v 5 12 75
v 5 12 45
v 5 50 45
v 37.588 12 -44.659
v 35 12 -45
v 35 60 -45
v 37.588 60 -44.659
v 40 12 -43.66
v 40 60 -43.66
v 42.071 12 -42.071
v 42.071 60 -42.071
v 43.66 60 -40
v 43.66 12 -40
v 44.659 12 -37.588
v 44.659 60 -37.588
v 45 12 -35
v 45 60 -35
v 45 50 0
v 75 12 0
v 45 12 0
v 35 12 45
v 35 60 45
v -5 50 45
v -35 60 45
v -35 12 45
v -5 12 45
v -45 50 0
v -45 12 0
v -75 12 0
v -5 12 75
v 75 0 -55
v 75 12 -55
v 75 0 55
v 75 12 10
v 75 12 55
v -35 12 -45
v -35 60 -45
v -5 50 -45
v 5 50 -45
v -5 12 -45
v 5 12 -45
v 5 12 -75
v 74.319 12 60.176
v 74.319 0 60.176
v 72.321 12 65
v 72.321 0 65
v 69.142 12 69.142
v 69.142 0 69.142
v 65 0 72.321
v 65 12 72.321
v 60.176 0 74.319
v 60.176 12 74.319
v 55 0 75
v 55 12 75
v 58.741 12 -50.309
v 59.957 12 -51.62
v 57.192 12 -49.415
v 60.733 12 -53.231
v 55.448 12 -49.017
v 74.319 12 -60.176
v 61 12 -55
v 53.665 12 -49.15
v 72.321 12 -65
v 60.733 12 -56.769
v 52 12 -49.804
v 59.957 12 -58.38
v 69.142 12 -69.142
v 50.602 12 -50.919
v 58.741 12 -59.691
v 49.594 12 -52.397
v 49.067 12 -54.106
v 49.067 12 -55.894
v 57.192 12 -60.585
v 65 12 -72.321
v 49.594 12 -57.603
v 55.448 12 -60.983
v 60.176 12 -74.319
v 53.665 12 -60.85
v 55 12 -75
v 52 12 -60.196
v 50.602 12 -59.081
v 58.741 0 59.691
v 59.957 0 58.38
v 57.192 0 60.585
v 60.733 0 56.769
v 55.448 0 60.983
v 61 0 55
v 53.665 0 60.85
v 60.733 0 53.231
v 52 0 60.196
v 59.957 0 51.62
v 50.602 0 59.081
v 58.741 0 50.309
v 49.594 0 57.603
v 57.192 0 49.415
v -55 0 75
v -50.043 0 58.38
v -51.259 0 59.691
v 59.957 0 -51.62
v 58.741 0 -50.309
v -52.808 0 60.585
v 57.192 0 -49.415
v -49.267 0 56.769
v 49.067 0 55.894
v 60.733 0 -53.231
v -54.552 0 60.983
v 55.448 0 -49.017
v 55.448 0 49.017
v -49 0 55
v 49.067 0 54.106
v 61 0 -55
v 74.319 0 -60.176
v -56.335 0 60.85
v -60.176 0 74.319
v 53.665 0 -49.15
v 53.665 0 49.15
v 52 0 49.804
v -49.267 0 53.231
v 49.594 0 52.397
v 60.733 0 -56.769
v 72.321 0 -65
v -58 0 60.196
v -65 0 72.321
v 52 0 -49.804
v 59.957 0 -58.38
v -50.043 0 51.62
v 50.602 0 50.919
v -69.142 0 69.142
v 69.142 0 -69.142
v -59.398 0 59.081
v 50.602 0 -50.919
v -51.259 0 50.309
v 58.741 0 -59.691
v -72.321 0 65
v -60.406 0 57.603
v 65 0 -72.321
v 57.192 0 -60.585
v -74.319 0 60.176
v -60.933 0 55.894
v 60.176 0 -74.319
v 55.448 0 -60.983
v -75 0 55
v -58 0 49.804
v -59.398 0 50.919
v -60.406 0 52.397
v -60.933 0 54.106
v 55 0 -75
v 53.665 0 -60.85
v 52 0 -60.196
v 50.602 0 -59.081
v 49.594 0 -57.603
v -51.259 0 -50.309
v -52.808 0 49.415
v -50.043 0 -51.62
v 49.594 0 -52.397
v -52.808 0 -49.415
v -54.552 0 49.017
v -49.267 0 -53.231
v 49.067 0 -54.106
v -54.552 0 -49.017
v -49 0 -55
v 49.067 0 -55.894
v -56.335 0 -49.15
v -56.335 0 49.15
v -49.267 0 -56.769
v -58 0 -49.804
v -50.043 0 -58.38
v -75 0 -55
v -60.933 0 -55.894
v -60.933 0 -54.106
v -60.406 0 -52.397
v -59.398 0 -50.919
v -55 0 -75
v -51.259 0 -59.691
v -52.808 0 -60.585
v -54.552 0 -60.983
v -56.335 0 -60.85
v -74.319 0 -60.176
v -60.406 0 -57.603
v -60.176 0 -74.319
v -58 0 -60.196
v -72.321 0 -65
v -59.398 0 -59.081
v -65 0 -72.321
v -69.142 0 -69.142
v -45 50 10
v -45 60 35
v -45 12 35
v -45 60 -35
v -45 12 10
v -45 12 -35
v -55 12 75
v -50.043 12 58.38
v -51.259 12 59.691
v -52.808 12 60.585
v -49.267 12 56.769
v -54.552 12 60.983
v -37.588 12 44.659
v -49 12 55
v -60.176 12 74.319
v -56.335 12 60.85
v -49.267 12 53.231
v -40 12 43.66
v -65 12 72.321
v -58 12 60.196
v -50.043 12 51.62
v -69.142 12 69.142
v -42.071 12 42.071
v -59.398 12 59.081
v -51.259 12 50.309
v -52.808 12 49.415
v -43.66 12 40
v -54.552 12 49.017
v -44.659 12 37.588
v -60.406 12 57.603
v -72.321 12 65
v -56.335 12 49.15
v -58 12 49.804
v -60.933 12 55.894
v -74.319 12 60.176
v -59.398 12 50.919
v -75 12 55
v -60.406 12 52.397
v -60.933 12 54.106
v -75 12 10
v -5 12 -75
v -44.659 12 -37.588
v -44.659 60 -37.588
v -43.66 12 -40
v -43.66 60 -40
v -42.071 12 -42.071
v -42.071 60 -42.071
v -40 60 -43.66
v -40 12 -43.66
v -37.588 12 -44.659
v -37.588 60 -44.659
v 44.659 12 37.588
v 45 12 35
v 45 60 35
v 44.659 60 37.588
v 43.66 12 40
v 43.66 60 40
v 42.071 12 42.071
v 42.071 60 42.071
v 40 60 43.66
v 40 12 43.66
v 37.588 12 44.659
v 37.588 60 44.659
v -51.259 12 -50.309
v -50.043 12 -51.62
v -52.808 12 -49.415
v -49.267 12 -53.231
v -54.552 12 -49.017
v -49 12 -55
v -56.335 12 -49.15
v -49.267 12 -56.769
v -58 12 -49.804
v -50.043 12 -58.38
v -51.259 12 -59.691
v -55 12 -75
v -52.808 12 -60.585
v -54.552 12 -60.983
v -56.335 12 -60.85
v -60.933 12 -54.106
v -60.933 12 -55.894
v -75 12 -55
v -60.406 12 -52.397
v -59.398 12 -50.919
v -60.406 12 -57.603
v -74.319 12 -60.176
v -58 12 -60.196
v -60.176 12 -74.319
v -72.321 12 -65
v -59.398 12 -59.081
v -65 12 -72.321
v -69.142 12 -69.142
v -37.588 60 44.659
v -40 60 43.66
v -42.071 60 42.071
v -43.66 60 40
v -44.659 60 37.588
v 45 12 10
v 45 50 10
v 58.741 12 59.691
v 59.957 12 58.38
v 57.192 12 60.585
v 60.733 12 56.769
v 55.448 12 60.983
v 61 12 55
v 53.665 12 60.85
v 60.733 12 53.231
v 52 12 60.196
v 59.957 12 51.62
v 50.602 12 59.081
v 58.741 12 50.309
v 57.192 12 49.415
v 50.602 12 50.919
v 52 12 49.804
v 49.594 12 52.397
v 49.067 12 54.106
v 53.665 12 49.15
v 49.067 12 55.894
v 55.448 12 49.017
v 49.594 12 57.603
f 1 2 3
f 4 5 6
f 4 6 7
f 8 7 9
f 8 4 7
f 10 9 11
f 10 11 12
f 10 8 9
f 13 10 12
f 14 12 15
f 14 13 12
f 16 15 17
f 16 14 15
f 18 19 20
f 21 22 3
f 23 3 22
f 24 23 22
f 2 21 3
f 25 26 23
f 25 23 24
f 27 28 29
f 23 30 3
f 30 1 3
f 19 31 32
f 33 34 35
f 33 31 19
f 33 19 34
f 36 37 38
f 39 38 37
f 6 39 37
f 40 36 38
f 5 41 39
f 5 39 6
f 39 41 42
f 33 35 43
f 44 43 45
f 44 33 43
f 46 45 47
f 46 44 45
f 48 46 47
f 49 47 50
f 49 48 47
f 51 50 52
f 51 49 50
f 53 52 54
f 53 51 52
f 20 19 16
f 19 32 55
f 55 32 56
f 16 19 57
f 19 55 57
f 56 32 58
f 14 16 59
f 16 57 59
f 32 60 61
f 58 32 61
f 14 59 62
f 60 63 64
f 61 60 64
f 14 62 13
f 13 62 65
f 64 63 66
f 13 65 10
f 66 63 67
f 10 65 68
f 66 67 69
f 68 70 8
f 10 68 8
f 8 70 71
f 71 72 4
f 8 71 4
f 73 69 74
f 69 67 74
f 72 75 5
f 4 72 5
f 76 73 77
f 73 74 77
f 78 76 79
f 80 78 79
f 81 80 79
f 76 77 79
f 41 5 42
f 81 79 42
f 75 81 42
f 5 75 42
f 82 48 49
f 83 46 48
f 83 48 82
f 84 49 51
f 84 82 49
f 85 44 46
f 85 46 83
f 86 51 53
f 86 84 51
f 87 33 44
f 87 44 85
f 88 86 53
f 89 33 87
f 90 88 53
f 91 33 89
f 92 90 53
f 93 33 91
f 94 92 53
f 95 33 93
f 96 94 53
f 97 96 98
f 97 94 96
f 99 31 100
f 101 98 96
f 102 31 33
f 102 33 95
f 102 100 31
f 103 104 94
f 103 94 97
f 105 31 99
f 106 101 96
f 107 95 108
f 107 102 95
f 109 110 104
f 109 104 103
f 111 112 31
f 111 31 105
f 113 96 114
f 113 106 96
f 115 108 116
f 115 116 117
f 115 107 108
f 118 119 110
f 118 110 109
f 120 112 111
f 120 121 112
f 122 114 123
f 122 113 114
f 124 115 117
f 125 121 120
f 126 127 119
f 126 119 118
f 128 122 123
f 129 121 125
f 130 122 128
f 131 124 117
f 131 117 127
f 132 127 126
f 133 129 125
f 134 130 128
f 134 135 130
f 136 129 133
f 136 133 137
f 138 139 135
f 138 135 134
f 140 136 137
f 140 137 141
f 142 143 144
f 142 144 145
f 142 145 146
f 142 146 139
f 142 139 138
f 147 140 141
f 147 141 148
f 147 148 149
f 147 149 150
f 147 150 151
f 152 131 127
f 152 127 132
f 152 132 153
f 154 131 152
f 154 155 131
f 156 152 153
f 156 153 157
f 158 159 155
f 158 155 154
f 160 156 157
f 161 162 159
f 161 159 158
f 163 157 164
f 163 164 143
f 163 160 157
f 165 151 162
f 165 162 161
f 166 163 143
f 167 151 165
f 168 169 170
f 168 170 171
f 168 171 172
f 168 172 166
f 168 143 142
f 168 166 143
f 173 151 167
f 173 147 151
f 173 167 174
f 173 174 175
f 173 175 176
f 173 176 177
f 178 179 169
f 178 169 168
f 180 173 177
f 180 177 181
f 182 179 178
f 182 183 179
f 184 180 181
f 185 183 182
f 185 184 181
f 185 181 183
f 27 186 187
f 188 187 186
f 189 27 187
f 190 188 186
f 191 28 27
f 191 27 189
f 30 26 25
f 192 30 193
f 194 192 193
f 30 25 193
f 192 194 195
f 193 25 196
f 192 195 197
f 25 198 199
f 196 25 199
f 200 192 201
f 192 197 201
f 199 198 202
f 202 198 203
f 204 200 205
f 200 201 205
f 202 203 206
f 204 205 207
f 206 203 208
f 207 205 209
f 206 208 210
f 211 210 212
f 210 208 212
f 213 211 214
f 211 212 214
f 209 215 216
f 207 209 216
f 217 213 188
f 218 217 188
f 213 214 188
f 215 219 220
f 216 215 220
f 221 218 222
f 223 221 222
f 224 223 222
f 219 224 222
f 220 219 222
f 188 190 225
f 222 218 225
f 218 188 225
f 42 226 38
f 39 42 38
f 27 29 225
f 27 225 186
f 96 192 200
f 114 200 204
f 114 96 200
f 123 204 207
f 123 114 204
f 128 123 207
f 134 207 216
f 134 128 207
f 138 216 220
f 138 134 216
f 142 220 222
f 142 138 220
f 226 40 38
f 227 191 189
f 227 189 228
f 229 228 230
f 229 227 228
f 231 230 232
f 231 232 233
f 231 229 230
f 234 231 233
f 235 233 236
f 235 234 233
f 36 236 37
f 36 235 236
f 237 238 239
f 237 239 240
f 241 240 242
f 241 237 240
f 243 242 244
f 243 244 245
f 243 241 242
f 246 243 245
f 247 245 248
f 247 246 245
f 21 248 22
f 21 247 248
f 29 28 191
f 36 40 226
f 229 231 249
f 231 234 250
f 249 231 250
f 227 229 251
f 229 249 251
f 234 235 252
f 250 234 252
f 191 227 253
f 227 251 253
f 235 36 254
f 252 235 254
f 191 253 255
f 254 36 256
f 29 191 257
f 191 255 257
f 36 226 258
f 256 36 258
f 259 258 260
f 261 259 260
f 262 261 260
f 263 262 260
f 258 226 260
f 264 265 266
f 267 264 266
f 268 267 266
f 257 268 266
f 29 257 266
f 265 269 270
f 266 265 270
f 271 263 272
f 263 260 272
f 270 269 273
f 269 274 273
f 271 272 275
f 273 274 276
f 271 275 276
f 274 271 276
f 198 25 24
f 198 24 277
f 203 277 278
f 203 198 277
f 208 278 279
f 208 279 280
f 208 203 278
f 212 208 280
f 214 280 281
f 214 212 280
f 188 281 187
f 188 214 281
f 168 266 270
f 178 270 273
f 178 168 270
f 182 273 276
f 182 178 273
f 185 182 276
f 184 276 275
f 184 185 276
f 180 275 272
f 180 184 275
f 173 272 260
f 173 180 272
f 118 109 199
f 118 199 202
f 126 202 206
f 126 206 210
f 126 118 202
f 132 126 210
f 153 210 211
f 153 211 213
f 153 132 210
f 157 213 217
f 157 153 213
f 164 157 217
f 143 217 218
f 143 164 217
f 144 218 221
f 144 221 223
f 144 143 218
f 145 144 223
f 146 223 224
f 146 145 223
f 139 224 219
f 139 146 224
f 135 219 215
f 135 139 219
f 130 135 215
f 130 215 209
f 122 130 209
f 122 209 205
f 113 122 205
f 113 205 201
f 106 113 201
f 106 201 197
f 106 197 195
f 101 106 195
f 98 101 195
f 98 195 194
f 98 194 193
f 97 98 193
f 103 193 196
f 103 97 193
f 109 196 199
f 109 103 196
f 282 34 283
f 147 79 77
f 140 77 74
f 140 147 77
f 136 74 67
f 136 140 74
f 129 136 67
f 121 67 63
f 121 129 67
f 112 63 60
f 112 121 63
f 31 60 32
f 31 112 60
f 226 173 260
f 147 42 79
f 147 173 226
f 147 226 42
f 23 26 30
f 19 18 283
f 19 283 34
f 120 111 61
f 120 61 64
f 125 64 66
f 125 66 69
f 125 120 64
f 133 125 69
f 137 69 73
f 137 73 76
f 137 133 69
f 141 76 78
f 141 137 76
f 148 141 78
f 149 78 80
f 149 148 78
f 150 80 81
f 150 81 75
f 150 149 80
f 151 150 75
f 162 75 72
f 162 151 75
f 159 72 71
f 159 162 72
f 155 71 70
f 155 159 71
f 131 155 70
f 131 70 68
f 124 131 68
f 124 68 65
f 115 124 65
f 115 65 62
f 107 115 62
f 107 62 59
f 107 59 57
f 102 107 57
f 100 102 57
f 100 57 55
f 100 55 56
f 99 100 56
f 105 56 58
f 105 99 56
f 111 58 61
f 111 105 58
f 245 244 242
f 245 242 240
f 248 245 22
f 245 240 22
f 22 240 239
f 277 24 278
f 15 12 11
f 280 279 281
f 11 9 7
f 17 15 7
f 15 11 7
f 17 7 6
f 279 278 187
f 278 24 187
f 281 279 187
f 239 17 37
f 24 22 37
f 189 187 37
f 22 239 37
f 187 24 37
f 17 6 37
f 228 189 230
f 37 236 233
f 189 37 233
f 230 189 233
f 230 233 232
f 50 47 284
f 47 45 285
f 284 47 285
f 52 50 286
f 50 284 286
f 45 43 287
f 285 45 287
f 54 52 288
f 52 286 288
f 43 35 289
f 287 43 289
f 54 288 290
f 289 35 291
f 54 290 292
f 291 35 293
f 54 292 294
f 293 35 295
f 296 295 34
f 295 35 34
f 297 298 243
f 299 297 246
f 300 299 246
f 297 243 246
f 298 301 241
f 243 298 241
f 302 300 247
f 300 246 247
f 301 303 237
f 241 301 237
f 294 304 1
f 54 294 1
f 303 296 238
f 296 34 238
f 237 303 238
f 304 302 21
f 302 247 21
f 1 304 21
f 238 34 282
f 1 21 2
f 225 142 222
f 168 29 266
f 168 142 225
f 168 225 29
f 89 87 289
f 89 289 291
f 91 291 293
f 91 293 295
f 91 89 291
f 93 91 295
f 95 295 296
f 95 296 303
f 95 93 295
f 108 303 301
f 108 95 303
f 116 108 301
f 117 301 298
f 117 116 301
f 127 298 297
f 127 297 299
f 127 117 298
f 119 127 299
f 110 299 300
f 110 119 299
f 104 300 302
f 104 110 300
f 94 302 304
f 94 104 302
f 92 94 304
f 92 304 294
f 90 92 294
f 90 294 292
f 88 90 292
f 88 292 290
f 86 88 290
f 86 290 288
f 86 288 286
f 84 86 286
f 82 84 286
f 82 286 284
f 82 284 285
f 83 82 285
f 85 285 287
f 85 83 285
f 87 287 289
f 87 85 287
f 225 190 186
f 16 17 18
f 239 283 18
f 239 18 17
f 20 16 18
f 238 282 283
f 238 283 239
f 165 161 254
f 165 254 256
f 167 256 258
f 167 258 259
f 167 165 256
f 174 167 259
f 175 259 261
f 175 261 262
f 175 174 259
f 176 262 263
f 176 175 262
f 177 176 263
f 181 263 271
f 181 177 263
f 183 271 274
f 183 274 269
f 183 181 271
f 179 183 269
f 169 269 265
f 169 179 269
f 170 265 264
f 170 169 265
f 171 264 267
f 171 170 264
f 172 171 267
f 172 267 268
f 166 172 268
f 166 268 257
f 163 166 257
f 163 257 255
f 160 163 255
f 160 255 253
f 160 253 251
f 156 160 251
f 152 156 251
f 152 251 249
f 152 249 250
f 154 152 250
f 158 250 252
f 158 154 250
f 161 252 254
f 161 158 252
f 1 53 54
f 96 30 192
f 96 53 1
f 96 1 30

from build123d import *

# Parameters (mm, degrees)
SKETCH1_R           = 6
BOSS_EXTRUDE2_DEPTH = 12
BOSS_EXTRUDE3_DEPTH = 48
BOSS_EXTRUDE5_DEPTH = 5
BOSS_EXTRUDE6_DEPTH = 10


with BuildPart() as part:
    # Sketch1 → Boss-Extrude2 (new body)
    with BuildSketch(Plane(origin=(0, 0, 0), x_dir=(1, 0, 0), z_dir=(0, 1, 0))):
        with BuildLine():
            Line((-55, 75), (55, 75))
            ThreePointArc((55, 75), (69.142135624, 69.142135624), (75, 55))
            Line((75, 55), (75, -55))
            ThreePointArc((75, -55), (69.142135624, -69.142135624), (55, -75))
            Line((55, -75), (-55, -75))
            ThreePointArc((-55, -75), (-69.142135624, -69.142135624), (-75, -55))
            Line((-75, -55), (-75, 55))
            ThreePointArc((-75, 55), (-69.142135624, 69.142135624), (-55, 75))
        make_face()
        with Locations((-55, 55)):
            Circle(SKETCH1_R, mode=Mode.SUBTRACT)
        with Locations((-55, -55)):
            Circle(SKETCH1_R, mode=Mode.SUBTRACT)
        with Locations((55, -55)):
            Circle(SKETCH1_R, mode=Mode.SUBTRACT)
        with Locations((55, 55)):
            Circle(SKETCH1_R, mode=Mode.SUBTRACT)
    extrude(amount=BOSS_EXTRUDE2_DEPTH)

    # Sketch2 → Boss-Extrude3 (add)
    with BuildSketch(Plane(origin=(0, 12, 0), x_dir=(1, 0, 0), z_dir=(0, 1, 0))):
        with BuildLine():
            Line((-35, 45), (35, 45))
            ThreePointArc((35, 45), (42.071067812, 42.071067812), (45, 35))
            Line((45, 35), (45, -35))
            ThreePointArc((45, -35), (42.071067812, -42.071067812), (35, -45))
            Line((35, -45), (-35, -45))
            ThreePointArc((-35, -45), (-42.071067812, -42.071067812), (-45, -35))
            Line((-45, -35), (-45, 35))
            ThreePointArc((-45, 35), (-42.071067812, 42.071067812), (-35, 45))
        make_face()
    extrude(amount=BOSS_EXTRUDE3_DEPTH)

    # Sketch3 → Boss-Extrude5 (add, symmetric)
    with BuildSketch(Plane(origin=(0, 0, 0), x_dir=(0, 0, -1), z_dir=(1, 0, 0))):
        Polygon((45, 50), (45, 12), (75, 12), align=None)
        Polygon((-45, 12), (-75, 12), (-45, 50), align=None)
    extrude(amount=BOSS_EXTRUDE5_DEPTH, both=True)

    # Sketch6 → Boss-Extrude6 (add)
    with BuildSketch(Plane.XY):
        Polygon((45, 50), (75, 12), (45, 12), align=None)
        Polygon((-45, 50), (-45, 12), (-75, 12), align=None)
    extrude(amount=BOSS_EXTRUDE6_DEPTH)


solid = part.part
